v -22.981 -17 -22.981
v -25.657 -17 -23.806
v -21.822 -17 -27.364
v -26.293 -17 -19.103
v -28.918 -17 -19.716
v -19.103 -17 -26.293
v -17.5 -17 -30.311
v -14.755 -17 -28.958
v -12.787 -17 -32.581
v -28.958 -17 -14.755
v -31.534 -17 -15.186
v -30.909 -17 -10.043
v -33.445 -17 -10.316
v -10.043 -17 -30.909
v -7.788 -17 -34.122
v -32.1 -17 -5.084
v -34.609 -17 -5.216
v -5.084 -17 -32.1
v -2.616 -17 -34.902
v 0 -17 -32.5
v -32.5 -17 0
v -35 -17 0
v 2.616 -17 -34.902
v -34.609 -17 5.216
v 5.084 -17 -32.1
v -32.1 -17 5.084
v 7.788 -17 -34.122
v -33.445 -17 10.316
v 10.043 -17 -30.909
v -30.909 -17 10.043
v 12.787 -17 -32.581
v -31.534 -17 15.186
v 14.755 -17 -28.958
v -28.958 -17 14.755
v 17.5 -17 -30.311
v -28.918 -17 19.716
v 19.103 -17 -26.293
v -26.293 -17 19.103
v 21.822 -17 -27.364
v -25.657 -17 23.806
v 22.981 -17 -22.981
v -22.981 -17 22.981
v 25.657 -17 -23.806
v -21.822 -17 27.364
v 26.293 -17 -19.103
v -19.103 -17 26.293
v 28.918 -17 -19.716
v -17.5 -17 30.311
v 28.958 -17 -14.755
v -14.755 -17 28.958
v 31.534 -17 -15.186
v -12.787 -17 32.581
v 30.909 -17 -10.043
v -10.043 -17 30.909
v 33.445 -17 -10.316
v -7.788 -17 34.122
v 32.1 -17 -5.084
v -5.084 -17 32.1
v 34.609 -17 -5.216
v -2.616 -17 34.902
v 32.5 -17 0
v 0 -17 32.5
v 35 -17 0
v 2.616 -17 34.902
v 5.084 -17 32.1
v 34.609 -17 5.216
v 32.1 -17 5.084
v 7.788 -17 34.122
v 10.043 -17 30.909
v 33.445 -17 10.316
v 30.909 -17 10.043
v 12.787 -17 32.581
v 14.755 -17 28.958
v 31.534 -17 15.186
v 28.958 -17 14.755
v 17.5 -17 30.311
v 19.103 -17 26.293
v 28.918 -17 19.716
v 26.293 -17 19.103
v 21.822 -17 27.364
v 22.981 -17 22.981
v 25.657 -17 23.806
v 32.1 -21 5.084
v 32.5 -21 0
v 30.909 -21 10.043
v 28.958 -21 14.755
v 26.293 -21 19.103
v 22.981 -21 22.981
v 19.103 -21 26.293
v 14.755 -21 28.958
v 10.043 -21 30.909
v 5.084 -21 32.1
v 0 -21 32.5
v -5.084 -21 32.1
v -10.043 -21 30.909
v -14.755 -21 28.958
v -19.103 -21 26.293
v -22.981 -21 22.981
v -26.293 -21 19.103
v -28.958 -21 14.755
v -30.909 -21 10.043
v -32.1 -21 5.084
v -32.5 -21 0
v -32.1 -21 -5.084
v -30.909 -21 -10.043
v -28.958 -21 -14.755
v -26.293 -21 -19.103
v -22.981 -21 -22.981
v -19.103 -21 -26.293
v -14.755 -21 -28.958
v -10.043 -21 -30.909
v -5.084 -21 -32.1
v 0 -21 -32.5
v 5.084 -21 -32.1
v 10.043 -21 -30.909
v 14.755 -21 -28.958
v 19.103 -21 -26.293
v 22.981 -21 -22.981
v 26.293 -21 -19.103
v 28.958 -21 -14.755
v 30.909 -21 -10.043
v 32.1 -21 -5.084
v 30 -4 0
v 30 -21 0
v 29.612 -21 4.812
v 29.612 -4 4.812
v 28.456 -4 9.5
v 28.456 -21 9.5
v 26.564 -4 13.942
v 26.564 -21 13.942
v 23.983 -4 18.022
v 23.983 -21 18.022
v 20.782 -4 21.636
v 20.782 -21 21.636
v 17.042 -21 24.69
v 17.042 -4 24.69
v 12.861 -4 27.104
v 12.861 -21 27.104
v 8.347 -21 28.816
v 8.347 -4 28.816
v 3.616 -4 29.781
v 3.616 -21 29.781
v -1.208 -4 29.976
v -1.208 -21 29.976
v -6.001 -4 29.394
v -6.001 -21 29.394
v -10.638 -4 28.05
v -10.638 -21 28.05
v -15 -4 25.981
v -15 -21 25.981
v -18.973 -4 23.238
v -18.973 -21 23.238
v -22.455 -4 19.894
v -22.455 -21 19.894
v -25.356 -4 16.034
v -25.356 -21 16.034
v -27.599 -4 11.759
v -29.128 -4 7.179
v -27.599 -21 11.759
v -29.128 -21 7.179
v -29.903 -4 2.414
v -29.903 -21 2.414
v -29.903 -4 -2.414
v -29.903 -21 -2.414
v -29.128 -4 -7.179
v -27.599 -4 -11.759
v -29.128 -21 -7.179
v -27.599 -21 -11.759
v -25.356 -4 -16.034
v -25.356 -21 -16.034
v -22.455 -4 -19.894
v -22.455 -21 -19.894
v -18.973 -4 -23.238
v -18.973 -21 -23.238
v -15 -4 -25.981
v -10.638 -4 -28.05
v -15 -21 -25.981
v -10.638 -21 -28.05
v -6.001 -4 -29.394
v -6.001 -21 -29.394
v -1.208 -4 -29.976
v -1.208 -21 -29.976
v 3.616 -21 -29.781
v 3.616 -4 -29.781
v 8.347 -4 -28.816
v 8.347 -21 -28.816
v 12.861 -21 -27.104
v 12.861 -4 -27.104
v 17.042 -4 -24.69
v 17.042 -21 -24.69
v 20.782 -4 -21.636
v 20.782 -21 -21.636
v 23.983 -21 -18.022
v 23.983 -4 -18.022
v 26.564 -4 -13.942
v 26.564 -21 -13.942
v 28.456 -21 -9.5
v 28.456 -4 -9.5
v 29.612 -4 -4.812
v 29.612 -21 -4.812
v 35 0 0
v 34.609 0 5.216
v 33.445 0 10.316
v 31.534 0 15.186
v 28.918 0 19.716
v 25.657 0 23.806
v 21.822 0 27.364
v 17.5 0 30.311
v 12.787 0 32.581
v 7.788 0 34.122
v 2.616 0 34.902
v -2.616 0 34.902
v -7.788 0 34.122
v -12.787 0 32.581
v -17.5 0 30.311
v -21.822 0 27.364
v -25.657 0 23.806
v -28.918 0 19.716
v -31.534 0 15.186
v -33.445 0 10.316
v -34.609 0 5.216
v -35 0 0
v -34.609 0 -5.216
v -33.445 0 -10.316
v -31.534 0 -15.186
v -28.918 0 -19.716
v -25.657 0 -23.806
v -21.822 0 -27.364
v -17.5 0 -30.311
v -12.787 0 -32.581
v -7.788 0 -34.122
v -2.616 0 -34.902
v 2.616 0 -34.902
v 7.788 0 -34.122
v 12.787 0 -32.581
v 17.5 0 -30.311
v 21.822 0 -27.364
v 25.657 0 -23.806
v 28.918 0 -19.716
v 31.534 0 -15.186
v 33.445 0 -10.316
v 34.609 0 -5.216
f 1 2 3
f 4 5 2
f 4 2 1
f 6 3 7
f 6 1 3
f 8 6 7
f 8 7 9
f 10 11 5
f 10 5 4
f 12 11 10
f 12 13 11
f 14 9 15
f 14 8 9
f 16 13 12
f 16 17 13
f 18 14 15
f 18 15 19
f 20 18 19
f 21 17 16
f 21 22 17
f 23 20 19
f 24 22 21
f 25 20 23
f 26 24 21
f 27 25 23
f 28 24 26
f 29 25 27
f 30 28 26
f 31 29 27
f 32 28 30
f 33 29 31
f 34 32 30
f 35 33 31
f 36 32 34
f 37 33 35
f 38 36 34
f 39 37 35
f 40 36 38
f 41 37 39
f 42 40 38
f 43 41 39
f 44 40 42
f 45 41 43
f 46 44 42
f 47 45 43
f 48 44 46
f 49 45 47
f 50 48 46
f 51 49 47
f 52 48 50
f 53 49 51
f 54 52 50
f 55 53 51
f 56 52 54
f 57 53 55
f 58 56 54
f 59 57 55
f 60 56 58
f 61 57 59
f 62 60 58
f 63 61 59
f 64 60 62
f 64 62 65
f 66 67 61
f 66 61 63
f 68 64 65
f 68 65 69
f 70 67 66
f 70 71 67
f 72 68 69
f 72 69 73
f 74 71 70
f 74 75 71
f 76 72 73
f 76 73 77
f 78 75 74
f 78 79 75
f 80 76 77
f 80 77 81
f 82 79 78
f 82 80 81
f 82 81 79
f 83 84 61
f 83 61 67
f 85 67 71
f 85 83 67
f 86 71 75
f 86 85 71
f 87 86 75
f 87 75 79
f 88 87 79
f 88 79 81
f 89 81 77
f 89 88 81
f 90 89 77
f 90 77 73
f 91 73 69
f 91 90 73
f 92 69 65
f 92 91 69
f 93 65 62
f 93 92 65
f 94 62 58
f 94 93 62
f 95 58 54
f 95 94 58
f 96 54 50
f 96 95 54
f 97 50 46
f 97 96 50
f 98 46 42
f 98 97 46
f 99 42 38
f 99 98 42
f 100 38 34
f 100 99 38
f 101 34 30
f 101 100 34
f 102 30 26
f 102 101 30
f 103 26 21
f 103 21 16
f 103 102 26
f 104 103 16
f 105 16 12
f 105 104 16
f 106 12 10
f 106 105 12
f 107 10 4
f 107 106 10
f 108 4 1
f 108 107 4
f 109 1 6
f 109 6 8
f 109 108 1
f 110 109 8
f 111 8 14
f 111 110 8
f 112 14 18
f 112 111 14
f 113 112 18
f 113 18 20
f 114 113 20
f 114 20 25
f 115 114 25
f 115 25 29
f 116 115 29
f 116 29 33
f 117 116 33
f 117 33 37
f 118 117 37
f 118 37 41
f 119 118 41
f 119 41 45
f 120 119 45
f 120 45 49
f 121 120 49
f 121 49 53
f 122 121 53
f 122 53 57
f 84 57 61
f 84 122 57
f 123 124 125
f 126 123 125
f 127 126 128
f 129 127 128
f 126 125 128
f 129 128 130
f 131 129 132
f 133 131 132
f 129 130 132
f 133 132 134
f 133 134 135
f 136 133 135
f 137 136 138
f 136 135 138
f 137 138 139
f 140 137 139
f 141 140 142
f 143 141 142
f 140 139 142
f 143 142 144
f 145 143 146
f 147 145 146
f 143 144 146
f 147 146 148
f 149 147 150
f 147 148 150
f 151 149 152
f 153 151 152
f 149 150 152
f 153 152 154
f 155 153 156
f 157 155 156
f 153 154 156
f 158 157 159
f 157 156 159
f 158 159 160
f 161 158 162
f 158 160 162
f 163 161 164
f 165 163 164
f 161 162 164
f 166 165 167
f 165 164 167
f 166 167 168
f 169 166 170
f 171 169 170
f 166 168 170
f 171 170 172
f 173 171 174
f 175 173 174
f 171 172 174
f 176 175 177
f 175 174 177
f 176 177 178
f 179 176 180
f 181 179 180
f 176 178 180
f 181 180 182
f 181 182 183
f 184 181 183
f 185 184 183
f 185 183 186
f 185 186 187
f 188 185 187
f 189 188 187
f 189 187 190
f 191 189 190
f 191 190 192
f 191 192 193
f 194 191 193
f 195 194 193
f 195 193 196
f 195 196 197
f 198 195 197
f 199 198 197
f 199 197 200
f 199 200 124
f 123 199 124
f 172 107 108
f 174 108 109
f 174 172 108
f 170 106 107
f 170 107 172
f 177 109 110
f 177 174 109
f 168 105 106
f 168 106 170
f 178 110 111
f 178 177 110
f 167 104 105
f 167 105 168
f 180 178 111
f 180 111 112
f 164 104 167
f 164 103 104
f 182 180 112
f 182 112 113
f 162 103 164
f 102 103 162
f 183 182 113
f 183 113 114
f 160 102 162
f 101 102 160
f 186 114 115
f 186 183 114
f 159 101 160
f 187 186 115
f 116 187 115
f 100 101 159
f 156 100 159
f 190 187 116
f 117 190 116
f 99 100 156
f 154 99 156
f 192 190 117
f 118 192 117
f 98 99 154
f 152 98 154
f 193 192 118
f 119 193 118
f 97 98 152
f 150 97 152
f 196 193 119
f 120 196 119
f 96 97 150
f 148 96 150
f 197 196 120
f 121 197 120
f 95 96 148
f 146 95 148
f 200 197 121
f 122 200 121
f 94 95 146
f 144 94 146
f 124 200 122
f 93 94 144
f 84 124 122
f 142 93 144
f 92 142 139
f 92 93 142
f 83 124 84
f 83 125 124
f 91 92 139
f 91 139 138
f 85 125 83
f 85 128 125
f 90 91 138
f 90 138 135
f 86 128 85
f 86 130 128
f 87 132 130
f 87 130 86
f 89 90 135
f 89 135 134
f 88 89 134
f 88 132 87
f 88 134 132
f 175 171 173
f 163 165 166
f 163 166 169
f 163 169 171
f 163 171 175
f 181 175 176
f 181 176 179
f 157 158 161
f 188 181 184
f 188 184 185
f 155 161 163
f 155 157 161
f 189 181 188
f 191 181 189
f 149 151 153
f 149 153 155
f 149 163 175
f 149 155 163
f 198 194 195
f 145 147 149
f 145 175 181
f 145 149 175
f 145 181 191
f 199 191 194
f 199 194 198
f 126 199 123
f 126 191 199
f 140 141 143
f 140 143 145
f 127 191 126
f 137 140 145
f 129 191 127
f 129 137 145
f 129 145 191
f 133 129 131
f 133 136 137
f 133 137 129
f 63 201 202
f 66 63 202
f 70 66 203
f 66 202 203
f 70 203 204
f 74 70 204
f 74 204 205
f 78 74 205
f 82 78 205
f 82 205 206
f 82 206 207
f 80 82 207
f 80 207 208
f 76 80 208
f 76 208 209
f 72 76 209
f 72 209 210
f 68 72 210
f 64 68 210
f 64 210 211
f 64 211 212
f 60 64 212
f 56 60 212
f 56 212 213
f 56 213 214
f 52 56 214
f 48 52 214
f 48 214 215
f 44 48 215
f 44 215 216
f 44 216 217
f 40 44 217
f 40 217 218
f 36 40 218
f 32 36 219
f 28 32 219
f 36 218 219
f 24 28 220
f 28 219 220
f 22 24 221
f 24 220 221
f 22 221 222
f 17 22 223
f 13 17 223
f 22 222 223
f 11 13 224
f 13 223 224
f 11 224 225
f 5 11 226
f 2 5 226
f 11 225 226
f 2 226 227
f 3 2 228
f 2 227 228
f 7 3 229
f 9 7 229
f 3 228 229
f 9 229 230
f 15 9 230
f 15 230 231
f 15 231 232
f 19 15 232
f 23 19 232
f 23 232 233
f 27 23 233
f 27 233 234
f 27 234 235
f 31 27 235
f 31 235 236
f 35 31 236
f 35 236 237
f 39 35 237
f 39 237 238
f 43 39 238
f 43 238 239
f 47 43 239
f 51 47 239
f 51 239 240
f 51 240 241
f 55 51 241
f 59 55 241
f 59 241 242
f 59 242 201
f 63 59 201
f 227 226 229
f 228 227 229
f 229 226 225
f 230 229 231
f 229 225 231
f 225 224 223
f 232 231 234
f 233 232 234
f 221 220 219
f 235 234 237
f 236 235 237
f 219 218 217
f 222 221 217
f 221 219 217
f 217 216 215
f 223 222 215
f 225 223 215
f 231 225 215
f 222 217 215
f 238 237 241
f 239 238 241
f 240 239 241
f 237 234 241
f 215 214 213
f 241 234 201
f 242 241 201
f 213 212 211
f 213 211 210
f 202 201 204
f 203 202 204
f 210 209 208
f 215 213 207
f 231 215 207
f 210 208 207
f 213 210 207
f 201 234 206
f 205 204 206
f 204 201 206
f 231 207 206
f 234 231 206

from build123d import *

# Parameters (mm, degrees)
F0_R     = 35
F1_DEPTH = 21
F2_R     = 30
F3_DEPTH = 17
F4_R     = 35
F4_R_2   = 32.5
F5_DEPTH = 4


with BuildPart() as f1:
    # F0 (on Front) → F1 (new body)
    with BuildSketch(Plane.XZ):
        Circle(F0_R)
    extrude(amount=F1_DEPTH)

    # F2 (on face) → F3 (cut)
    with BuildSketch(Plane.XZ.offset(21)):
        Circle(F2_R)
    extrude(amount=-F3_DEPTH, mode=Mode.SUBTRACT)

    # F4 (on face) → F5 (cut)
    with BuildSketch(Plane.XZ.offset(21)):
        Circle(F4_R)
        Circle(F4_R_2, mode=Mode.SUBTRACT)
    extrude(amount=-F5_DEPTH, mode=Mode.SUBTRACT)


solid = f1.part
